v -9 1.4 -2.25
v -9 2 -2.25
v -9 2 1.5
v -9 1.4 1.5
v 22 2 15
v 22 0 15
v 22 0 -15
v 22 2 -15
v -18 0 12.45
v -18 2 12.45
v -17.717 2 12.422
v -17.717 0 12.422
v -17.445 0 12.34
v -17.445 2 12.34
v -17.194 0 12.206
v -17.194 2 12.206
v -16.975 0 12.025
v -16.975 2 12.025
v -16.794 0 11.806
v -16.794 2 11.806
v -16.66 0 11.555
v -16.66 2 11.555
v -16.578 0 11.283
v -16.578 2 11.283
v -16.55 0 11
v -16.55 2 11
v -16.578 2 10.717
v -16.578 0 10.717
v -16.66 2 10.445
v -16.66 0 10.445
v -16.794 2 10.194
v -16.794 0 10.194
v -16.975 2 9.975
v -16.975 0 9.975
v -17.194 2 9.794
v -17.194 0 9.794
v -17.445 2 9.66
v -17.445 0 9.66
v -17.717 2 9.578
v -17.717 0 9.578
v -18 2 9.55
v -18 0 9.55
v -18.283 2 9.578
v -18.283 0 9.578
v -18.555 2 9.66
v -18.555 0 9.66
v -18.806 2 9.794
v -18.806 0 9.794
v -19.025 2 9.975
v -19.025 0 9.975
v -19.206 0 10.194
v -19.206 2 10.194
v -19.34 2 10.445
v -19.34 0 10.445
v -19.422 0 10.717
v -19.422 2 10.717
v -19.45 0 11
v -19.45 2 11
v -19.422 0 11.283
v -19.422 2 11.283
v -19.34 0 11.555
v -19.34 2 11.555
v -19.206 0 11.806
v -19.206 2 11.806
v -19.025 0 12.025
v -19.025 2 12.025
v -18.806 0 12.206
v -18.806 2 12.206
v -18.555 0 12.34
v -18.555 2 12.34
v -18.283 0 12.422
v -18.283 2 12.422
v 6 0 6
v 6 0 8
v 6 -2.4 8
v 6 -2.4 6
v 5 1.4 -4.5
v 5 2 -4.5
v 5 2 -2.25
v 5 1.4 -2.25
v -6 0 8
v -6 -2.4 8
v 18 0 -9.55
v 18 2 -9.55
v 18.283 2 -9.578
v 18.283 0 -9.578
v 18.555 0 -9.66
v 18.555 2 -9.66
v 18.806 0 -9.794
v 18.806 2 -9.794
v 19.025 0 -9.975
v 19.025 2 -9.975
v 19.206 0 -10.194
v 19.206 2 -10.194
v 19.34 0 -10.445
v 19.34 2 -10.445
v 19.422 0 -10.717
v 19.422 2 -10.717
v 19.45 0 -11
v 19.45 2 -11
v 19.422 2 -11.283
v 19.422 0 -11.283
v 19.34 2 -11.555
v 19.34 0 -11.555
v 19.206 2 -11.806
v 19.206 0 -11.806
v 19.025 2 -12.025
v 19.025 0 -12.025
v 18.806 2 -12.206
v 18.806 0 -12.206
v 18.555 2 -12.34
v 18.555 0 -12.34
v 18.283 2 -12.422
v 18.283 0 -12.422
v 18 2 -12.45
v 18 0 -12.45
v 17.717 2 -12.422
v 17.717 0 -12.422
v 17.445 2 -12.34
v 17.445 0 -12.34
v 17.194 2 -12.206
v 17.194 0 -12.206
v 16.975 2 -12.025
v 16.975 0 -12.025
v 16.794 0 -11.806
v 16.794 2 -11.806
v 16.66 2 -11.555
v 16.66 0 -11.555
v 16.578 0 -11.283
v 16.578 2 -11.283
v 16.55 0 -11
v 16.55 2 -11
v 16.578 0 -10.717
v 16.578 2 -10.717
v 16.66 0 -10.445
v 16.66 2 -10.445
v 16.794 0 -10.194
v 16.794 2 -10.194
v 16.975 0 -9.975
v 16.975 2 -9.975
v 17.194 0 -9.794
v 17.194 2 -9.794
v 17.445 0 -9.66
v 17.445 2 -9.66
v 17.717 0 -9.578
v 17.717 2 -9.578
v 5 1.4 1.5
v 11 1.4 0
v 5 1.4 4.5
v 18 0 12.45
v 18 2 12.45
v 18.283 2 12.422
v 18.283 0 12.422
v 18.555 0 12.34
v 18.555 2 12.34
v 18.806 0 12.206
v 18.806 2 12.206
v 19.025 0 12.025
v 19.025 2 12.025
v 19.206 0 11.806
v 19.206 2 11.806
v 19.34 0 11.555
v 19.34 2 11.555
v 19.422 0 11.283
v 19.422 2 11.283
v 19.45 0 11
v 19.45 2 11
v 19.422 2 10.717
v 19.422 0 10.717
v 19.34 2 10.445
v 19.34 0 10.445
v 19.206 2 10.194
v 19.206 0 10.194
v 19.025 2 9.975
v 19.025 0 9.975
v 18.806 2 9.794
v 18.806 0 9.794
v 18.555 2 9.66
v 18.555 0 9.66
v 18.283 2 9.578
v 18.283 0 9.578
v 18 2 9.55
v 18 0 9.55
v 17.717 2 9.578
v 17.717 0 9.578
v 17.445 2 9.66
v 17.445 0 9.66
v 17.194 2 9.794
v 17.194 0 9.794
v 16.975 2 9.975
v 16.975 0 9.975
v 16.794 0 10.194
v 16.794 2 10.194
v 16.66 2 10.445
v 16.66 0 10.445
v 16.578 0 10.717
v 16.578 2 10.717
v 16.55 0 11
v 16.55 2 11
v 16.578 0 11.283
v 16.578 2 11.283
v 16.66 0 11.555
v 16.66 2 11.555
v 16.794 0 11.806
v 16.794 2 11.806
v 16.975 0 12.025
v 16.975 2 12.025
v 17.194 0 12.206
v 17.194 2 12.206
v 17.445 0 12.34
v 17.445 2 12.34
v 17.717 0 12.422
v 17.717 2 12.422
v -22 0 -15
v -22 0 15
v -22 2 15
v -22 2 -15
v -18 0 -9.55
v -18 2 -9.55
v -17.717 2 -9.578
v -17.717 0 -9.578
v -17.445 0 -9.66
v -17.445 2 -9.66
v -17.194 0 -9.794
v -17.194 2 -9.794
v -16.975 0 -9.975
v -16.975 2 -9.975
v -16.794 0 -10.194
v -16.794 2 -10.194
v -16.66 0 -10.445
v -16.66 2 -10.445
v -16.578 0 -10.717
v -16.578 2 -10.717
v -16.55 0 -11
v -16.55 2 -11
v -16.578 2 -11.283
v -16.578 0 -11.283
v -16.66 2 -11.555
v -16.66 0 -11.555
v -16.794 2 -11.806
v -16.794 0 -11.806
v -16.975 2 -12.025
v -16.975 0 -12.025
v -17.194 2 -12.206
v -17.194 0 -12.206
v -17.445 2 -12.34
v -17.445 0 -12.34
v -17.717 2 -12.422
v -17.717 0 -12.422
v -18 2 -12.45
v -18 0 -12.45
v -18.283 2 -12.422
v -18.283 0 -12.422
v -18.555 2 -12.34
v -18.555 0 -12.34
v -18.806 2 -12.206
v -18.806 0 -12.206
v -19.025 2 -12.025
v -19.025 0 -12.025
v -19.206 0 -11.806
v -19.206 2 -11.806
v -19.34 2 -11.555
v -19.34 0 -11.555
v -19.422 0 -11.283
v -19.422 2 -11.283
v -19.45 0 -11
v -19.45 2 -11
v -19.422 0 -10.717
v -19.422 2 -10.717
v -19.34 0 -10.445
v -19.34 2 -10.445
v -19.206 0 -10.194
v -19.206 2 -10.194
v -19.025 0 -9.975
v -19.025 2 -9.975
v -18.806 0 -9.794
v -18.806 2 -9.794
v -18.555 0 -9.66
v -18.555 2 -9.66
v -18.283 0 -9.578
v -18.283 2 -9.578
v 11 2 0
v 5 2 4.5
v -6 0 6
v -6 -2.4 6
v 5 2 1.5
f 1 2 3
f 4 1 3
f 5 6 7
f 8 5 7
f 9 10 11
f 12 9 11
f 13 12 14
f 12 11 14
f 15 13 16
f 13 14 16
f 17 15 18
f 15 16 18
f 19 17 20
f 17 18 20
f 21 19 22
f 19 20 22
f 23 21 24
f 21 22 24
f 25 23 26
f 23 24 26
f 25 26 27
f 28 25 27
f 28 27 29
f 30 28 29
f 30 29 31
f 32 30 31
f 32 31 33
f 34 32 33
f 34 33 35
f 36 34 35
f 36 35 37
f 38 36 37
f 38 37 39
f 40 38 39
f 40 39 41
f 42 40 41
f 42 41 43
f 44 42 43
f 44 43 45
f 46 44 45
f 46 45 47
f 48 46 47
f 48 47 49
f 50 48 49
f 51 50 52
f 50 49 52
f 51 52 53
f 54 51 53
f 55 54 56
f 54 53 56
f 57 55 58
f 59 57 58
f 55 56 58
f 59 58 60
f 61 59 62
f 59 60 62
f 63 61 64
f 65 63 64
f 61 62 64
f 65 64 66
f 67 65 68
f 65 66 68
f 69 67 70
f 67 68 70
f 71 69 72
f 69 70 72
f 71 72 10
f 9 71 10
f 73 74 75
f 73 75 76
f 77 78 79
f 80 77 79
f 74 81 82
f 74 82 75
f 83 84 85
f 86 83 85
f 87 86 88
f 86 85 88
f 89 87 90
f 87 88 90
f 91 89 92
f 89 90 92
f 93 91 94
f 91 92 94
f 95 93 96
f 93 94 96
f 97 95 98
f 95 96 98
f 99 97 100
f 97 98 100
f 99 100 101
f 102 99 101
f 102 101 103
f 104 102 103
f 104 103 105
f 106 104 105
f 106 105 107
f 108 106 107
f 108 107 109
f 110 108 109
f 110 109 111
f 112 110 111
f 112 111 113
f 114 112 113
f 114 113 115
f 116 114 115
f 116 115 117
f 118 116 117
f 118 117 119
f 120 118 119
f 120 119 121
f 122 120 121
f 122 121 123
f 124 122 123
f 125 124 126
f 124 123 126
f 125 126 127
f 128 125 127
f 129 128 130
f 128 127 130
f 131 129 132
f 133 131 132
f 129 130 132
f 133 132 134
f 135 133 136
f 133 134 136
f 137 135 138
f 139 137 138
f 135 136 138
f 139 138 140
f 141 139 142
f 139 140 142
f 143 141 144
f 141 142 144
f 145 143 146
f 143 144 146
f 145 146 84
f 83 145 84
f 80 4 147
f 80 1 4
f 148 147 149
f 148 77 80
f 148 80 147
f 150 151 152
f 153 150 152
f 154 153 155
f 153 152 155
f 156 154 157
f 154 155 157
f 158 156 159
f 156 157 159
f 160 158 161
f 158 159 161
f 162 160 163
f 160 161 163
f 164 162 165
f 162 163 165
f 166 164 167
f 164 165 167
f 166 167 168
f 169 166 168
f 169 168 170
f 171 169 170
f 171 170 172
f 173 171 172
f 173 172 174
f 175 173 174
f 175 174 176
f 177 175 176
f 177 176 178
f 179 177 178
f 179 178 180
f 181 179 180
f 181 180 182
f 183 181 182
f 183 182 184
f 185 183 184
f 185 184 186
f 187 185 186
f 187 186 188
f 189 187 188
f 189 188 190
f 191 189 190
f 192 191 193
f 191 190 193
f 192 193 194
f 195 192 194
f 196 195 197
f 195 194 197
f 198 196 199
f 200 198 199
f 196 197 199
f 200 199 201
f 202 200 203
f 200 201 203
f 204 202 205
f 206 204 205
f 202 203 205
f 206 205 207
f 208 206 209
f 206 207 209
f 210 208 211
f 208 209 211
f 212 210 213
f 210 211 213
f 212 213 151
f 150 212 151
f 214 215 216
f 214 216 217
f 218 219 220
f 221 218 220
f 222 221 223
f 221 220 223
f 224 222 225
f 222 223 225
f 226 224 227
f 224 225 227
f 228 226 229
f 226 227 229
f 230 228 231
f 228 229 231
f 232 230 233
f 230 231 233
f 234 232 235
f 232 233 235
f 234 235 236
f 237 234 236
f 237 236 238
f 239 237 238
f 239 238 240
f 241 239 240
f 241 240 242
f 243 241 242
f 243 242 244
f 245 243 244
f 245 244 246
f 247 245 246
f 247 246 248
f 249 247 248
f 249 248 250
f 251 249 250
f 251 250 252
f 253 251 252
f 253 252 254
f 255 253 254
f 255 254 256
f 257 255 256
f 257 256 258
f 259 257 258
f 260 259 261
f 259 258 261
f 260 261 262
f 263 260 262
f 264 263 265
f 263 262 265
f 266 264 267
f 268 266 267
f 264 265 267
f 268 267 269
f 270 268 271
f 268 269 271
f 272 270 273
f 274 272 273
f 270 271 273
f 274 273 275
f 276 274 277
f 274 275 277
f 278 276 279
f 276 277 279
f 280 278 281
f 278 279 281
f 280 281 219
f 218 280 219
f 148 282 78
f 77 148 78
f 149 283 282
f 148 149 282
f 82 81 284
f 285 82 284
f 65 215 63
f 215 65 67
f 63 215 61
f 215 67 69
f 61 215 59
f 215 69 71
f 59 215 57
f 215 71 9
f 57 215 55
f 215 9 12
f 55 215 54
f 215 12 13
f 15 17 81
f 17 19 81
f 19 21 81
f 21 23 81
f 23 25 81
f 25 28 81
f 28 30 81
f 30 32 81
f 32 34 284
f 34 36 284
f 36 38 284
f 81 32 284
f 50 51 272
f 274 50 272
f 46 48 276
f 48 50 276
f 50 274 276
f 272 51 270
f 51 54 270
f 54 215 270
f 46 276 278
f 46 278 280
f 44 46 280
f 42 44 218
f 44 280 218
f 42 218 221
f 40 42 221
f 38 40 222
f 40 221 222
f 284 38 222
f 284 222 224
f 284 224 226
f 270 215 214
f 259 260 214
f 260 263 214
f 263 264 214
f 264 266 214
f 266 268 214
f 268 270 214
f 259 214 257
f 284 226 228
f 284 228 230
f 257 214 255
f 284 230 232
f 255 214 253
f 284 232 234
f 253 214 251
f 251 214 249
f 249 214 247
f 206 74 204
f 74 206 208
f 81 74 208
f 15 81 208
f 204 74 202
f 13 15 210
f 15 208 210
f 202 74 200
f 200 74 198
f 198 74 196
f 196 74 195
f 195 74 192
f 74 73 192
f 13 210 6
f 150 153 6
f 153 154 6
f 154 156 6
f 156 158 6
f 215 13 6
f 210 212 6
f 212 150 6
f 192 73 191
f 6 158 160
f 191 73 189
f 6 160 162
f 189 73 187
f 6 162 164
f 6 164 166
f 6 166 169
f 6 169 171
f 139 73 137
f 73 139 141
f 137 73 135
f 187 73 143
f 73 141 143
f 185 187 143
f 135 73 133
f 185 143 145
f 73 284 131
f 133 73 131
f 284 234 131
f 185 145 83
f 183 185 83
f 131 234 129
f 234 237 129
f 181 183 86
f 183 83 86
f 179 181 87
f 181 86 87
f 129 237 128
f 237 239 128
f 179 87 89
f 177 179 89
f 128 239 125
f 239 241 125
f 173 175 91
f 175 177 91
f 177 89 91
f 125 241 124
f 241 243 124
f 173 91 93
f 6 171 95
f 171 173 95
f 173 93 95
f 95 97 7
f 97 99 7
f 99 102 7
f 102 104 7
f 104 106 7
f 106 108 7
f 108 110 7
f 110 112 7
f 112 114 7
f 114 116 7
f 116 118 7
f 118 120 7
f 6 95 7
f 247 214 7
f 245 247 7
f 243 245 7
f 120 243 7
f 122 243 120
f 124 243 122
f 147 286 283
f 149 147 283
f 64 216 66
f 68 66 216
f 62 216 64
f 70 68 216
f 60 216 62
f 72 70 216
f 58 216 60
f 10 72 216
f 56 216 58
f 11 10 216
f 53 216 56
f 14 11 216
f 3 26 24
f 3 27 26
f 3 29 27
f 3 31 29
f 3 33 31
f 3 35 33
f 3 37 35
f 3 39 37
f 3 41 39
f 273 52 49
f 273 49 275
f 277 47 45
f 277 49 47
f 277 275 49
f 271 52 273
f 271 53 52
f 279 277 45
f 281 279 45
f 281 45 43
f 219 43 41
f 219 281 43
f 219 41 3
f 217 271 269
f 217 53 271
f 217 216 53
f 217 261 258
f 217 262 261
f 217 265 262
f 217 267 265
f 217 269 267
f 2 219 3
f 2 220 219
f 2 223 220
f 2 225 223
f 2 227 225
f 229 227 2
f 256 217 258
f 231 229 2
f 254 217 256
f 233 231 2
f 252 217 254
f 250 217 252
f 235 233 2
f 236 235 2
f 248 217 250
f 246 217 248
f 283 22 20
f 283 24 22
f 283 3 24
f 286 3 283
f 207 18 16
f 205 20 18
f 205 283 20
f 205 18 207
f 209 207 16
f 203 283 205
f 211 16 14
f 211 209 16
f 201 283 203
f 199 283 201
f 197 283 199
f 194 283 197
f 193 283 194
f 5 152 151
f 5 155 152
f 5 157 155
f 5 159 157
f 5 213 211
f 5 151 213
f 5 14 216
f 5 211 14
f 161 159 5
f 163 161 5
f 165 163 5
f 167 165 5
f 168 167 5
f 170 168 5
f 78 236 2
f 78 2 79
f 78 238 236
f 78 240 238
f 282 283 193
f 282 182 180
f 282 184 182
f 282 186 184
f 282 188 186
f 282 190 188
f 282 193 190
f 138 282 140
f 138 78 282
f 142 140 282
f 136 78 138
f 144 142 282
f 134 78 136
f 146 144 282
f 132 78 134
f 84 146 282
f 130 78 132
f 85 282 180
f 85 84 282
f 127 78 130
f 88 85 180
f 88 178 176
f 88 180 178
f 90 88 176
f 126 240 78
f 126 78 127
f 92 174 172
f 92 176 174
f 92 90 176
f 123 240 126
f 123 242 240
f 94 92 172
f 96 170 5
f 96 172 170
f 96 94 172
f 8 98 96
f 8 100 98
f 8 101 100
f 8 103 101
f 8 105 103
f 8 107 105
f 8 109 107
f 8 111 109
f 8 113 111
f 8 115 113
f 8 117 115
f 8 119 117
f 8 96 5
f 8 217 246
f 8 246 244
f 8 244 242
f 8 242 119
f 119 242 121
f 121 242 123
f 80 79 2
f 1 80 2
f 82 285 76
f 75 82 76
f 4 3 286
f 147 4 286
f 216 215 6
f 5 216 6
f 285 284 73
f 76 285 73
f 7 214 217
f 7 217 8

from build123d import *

# Parameters (mm, degrees)
SKETCH1_W                 = 44
SKETCH1_H                 = 30
LID_PLATE_DEPTH           = 2
SKETCH2_R                 = 1.45
CLEARANCE_HOLES_DEPTH     = 3
FORWARD_ARROW_X_DEPTH     = 0.6
SKETCH4_W                 = 12
SKETCH4_H                 = 2
BOARD_HOLD_DOWN_RIB_DEPTH = 2.4


with BuildPart() as part:
    # Sketch1 → Lid Plate (new body)
    with BuildSketch(Plane(origin=(0, 0, 0), x_dir=(1, 0, 0), z_dir=(0, 1, 0))):
        Rectangle(SKETCH1_W, SKETCH1_H)
    extrude(amount=LID_PLATE_DEPTH)

    # Sketch2 → Clearance Holes (cut)
    with BuildSketch(Plane(origin=(0, 2, 0), x_dir=(1, 0, 0), z_dir=(0, 1, 0))):
        with Locations(Location((-18, -11, 0), (0, 0, 270))):
            Circle(SKETCH2_R)
        with Locations(Location((-18, 11, 0), (0, 0, 270))):
            Circle(SKETCH2_R)
        with Locations(Location((18, -11, 0), (0, 0, 270))):
            Circle(SKETCH2_R)
        with Locations(Location((18, 11, 0), (0, 0, 270))):
            Circle(SKETCH2_R)
    extrude(amount=-CLEARANCE_HOLES_DEPTH, mode=Mode.SUBTRACT)

    # Sketch3 → Forward Arrow (+X) (cut)
    with BuildSketch(Plane(origin=(0, 2, 0), x_dir=(1, 0, 0), z_dir=(0, 1, 0))):
        Polygon((-9, -1.5), (5, -1.5), (5, -4.5), (11, 0), (5, 4.5), (5, 2.25), (-9, 2.25), align=None)
    extrude(amount=-FORWARD_ARROW_X_DEPTH, mode=Mode.SUBTRACT)

    # Sketch4 → Board Hold-Down Rib (add)
    with BuildSketch(Plane(origin=(0, 0, 0), x_dir=(1, 0, 0), z_dir=(0, 1, 0))):
        with Locations((0, -7)):
            Rectangle(SKETCH4_W, SKETCH4_H)
    extrude(amount=-BOARD_HOLD_DOWN_RIB_DEPTH)


solid = part.part
